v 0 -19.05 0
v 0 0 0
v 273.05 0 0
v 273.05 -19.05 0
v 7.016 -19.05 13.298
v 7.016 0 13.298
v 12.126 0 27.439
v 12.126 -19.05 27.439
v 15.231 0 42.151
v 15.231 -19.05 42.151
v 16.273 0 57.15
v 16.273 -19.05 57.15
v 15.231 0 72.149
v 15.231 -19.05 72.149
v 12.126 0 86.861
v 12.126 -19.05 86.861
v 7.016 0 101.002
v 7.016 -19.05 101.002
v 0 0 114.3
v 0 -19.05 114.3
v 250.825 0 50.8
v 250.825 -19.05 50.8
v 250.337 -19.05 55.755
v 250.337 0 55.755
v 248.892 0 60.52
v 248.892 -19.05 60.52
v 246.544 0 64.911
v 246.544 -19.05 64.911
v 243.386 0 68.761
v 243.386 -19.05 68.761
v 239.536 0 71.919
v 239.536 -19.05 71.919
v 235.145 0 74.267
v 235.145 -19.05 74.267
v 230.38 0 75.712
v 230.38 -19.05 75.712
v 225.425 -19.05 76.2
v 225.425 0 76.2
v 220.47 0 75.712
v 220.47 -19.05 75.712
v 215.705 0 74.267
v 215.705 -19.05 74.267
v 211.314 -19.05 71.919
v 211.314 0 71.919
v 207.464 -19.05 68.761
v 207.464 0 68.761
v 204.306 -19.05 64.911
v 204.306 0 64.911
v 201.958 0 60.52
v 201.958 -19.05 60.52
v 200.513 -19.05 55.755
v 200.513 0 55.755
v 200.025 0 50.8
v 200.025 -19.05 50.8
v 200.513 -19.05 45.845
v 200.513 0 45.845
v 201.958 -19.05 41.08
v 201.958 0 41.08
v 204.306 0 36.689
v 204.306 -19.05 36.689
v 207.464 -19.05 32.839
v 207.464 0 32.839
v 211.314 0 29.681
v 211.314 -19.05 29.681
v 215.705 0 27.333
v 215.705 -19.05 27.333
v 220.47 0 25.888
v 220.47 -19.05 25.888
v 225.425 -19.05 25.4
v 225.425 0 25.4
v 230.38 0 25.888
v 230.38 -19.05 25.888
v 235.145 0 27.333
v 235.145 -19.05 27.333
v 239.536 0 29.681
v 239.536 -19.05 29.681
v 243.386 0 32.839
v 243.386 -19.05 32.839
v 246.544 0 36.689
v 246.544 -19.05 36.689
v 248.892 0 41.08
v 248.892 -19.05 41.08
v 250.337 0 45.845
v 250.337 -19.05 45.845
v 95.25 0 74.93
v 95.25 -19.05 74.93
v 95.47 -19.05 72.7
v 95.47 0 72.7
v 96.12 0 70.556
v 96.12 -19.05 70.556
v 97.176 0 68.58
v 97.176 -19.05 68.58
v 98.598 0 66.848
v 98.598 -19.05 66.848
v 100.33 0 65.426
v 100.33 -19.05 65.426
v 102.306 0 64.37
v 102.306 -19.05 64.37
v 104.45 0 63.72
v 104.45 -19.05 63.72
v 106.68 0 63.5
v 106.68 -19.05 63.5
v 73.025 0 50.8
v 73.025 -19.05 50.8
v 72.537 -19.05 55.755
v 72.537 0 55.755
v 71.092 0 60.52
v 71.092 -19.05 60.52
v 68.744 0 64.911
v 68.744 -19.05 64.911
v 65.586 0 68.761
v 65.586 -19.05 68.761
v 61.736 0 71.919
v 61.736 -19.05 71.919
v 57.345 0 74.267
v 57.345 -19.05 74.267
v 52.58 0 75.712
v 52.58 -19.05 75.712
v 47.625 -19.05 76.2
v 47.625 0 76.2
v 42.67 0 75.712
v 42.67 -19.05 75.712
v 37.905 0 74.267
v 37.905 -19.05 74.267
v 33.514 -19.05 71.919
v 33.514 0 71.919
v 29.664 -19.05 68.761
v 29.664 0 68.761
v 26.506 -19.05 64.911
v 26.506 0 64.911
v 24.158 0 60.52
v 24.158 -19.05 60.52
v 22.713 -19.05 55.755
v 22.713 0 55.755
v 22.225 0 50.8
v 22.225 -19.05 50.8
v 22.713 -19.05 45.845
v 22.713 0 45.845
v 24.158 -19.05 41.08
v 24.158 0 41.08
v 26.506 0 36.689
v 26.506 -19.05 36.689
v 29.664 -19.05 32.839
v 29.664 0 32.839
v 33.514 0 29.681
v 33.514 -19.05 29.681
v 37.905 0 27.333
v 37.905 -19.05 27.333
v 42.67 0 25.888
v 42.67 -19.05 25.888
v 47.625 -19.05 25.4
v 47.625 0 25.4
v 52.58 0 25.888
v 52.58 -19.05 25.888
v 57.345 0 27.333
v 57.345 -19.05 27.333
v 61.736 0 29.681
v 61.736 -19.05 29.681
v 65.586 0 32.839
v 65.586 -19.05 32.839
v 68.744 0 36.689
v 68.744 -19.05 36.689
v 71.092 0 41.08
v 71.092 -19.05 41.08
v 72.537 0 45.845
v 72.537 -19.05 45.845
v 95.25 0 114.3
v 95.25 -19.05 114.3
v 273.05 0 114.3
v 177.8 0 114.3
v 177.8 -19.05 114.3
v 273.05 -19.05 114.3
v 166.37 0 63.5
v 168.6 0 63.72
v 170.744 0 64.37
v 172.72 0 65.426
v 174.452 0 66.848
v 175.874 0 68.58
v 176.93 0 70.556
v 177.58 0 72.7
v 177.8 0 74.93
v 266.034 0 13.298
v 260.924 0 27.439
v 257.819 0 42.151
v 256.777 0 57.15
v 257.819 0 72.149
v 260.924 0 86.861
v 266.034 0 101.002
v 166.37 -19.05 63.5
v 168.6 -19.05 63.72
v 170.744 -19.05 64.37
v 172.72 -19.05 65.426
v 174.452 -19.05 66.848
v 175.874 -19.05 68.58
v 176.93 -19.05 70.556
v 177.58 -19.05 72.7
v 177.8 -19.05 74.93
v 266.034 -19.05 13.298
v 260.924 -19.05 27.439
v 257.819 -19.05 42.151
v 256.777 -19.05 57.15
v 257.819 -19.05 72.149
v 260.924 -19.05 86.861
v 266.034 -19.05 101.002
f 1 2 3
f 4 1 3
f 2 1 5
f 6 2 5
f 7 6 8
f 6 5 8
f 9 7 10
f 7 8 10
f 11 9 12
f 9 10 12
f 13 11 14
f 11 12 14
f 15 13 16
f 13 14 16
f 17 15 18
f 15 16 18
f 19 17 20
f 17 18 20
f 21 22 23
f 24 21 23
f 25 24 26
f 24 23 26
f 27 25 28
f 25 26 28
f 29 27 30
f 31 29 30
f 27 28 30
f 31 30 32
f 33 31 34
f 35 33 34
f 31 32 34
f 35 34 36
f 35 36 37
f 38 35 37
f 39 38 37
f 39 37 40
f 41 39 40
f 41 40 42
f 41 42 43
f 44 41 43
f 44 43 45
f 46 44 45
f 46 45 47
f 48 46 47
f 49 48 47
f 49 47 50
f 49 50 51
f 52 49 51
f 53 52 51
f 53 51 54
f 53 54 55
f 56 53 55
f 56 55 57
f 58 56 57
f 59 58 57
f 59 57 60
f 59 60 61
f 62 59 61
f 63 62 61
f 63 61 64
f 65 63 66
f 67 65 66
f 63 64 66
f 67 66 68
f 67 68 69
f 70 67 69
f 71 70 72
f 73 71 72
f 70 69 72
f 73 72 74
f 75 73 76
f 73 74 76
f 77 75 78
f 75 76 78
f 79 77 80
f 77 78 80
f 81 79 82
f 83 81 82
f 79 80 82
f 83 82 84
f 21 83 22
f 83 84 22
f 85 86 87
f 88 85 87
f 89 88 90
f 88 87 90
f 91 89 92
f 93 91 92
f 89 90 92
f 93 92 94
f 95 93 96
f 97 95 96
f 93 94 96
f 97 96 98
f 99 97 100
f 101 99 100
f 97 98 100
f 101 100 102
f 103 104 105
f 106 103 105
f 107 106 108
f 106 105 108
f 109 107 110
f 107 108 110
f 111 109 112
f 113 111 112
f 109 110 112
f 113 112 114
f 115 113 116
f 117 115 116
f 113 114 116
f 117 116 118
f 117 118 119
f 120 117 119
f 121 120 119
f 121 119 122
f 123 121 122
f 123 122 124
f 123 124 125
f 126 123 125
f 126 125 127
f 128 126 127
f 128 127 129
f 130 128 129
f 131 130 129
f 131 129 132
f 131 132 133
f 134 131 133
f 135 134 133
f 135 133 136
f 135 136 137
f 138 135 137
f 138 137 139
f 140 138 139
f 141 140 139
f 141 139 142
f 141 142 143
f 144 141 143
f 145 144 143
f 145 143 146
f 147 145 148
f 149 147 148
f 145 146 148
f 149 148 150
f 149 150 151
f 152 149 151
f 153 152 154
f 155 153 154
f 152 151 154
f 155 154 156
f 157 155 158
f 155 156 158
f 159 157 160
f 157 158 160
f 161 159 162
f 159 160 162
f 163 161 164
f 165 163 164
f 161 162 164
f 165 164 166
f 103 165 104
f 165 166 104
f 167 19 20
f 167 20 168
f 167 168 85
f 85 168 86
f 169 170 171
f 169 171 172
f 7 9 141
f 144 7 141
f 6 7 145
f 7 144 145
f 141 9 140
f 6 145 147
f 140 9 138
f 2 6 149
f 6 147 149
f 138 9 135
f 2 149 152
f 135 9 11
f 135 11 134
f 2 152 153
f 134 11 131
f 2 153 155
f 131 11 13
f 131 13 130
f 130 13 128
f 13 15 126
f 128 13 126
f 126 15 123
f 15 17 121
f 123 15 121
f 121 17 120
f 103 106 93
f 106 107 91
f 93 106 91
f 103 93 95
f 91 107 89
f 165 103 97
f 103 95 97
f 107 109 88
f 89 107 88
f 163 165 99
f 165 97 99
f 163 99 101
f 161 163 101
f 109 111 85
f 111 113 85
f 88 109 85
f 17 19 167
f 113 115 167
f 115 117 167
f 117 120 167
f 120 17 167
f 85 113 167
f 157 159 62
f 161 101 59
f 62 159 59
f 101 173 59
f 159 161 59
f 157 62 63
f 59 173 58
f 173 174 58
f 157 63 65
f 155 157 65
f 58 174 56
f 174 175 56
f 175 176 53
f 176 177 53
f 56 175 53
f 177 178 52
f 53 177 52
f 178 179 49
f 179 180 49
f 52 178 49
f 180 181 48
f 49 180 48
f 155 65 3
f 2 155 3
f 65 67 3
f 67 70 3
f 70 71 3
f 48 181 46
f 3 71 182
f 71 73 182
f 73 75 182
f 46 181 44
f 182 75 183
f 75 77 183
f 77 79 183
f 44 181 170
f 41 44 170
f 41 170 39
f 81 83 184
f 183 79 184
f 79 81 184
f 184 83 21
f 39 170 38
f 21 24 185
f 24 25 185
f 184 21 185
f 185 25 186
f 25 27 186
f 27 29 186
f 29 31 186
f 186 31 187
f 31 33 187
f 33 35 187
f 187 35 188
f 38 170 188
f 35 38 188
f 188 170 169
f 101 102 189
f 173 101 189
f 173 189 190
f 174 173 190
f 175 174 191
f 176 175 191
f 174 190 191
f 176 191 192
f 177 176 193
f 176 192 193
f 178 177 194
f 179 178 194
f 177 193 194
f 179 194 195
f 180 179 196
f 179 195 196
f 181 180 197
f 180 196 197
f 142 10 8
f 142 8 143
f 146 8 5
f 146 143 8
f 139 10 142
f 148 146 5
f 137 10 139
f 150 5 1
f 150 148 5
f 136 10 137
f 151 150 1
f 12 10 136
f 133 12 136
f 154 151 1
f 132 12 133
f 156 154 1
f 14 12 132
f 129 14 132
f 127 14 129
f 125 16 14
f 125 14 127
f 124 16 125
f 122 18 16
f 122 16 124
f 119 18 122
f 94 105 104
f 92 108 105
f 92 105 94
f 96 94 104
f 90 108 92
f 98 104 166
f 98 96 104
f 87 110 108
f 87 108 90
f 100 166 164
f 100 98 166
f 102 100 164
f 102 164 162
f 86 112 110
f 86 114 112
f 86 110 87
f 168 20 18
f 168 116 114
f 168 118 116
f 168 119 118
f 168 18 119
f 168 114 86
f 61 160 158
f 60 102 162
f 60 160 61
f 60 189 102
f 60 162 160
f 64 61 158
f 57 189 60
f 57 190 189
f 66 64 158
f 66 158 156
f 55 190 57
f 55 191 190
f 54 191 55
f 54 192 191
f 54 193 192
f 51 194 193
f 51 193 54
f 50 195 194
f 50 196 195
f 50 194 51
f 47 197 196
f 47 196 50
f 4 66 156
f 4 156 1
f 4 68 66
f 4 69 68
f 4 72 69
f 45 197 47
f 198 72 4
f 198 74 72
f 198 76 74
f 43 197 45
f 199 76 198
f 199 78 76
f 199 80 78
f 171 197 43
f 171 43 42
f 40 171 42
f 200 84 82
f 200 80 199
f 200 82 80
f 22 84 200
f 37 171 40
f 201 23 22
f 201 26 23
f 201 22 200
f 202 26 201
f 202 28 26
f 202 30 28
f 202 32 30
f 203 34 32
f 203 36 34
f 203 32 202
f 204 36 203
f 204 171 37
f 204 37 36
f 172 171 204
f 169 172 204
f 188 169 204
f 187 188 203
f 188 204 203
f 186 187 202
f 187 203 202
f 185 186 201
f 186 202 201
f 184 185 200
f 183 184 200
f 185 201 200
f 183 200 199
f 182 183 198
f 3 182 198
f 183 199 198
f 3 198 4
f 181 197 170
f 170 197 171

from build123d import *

# Parameters (mm, degrees)
F0_W     = 273.05
F0_H     = 114.3
F1_DEPTH = 19.05
F2_R     = 25.4
F3_DEPTH = 25.4
F5_DEPTH = 25.4
F7_DEPTH = 25.4


with BuildPart() as f1:
    # F0 (on Front) → F1 (new body)
    with BuildSketch(Plane.XZ):
        with Locations((136.525, 57.15)):
            Rectangle(F0_W, F0_H)
    extrude(amount=F1_DEPTH)

    # F2 (on face) → F3 (cut)
    with BuildSketch(Plane.XZ.offset(19.05)):
        with Locations((47.625, 50.8)):
            Circle(F2_R)
        with Locations((225.425, 50.8)):
            Circle(F2_R)
    extrude(amount=-F3_DEPTH, mode=Mode.SUBTRACT)

    # F4 (on face) → F5 (cut)
    with BuildSketch(Plane.XZ.offset(19.05)):
        with BuildLine():
            Line((177.8, 114.3), (95.25, 114.3))
            Line((95.25, 114.3), (95.25, 74.93))
            ThreePointArc((95.25, 74.93), (98.597769, 66.847769), (106.68, 63.5))
            Line((106.68, 63.5), (166.37, 63.5))
            ThreePointArc((166.37, 63.5), (174.452231, 66.847769), (177.8, 74.93))
            Line((177.8, 74.93), (177.8, 114.3))
        make_face()
    extrude(amount=-F5_DEPTH, mode=Mode.SUBTRACT)

    # F6 (on face) → F7 (cut)
    with BuildSketch(Plane.XZ.offset(19.05)):
        with BuildLine():
            Line((0, 114.3), (0, 0))
            ThreePointArc((0, 0), (16.273098, 57.15), (0, 114.3))
        make_face()
        with BuildLine():
            ThreePointArc((273.05, 114.3), (256.776902, 57.15), (273.05, 0))
            Line((273.05, 0), (273.05, 114.3))
        make_face()
    extrude(amount=-F7_DEPTH, mode=Mode.SUBTRACT)


solid = f1.part
